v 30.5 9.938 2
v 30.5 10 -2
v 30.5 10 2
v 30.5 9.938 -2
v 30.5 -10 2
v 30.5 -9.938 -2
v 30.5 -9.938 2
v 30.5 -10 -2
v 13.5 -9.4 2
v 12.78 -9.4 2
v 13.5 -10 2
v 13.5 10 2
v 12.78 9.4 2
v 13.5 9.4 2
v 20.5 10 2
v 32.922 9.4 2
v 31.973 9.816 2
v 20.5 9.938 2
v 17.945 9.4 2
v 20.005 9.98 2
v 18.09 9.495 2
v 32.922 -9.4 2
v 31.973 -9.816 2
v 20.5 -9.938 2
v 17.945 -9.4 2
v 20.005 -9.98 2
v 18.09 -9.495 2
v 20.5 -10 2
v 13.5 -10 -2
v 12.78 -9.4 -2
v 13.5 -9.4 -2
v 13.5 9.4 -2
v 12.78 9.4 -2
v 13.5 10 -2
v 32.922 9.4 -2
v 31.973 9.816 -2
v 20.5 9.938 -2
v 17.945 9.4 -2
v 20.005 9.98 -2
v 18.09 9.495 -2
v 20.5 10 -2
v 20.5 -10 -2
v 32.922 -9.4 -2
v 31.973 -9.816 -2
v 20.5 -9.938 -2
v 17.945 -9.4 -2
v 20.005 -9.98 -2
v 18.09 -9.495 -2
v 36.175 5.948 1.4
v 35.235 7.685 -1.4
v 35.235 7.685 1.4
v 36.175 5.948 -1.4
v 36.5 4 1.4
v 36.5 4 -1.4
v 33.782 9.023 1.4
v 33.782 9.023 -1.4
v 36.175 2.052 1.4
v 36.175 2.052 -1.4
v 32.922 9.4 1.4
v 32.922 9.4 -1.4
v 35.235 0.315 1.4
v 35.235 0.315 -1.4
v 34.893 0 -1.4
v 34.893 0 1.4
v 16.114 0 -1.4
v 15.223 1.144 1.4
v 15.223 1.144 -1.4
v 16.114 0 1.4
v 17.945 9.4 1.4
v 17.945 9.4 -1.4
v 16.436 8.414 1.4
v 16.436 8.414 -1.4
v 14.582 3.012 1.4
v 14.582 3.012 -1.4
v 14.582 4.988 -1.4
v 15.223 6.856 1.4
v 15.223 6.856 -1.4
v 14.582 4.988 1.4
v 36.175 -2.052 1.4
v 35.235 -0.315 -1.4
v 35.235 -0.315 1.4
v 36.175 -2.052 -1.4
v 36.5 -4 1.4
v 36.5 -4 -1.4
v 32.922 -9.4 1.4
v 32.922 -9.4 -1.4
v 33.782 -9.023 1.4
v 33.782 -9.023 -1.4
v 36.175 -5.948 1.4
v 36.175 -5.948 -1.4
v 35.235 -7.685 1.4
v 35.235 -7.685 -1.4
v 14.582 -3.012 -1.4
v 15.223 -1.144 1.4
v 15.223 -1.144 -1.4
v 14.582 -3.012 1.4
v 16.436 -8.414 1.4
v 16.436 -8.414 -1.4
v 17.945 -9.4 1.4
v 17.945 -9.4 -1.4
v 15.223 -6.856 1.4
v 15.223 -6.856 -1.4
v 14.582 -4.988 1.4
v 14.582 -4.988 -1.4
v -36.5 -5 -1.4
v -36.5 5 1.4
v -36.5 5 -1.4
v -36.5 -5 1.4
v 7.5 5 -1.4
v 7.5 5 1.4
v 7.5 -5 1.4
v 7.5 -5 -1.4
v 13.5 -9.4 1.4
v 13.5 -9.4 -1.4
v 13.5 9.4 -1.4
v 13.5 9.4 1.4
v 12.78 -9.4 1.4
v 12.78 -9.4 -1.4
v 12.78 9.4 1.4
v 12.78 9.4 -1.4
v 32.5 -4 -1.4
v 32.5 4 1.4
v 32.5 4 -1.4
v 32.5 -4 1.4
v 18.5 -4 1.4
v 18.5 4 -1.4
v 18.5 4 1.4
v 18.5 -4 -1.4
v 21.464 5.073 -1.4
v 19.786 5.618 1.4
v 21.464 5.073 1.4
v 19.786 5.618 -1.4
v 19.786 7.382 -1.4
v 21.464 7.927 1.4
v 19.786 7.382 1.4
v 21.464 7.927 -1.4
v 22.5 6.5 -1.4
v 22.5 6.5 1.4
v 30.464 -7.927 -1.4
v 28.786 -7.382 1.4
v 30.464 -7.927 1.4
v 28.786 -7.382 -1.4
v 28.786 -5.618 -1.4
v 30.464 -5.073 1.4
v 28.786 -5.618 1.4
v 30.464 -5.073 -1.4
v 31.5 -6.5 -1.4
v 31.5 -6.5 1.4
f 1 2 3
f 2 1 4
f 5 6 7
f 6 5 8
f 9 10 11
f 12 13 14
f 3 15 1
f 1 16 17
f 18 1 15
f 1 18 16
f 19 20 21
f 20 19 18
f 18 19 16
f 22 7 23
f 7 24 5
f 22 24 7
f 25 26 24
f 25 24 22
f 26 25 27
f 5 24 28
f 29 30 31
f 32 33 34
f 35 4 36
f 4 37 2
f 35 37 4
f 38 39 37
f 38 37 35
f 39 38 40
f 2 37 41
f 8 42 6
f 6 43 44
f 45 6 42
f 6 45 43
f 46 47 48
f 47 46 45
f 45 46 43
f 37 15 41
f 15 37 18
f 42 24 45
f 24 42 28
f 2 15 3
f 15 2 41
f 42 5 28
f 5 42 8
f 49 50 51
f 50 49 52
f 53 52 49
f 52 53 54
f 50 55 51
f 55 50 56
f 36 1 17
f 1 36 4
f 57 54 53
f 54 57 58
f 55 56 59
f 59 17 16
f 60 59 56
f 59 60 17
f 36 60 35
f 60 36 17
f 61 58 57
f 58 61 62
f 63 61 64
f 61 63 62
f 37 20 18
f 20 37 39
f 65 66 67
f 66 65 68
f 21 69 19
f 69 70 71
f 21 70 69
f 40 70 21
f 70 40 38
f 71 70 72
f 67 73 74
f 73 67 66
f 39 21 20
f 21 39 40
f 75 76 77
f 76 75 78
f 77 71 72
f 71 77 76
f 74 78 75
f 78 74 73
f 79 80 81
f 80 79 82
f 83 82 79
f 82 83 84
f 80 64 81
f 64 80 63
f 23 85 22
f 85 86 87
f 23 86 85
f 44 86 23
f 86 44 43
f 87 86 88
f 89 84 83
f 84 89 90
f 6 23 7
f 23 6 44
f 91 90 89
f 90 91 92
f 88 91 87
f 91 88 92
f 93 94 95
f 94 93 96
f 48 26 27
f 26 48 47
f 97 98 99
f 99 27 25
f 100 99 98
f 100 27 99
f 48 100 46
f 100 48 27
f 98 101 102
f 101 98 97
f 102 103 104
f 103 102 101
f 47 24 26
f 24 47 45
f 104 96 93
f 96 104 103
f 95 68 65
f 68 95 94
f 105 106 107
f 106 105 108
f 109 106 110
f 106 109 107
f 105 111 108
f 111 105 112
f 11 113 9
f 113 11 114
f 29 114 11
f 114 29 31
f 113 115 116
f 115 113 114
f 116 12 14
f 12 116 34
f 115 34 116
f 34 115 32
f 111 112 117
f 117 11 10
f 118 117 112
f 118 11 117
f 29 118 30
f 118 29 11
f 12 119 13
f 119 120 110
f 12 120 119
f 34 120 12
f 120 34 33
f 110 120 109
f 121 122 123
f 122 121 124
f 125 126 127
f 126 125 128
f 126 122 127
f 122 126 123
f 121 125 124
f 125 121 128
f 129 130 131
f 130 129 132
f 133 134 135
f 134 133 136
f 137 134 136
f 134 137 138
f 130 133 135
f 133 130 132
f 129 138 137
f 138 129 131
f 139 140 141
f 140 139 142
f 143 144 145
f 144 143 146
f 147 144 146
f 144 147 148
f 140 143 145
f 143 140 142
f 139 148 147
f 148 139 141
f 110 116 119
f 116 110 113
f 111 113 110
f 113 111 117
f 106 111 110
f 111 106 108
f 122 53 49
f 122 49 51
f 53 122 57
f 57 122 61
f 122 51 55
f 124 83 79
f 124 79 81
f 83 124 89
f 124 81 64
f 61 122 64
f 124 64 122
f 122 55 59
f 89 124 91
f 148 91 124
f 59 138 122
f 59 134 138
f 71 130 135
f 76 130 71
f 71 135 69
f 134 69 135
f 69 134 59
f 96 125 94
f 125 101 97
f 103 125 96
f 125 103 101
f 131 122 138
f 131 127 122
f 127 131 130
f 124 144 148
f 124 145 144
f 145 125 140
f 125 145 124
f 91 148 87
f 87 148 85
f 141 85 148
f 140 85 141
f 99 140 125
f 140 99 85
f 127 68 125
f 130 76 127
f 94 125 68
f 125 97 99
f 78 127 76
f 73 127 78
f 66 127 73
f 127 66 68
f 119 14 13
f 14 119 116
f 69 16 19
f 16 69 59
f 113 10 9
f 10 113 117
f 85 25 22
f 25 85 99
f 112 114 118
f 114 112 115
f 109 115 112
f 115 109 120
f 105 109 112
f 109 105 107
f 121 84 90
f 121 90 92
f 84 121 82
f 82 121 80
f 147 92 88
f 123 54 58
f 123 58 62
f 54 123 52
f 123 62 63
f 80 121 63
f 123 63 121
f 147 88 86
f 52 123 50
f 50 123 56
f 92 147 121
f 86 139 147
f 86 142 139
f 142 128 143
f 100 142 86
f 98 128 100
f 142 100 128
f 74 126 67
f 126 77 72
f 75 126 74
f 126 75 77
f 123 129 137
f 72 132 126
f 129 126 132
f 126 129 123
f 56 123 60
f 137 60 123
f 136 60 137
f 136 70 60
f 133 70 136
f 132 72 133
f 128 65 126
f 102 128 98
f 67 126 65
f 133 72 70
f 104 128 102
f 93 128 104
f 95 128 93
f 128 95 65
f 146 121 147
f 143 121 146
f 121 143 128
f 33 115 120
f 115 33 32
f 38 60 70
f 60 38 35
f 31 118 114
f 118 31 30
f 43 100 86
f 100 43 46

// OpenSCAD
// Parameters
L = 73.0; //[36.5:146.0:0.5]
W_max = 20.0; //[10.0:40.0:0.5]
T = 4.0; //[2.0:8.0:0.25]
handle_L = 45.0; //[22.5:90.0:0.5]
handle_W = 10.0; //[5.0:20.0:0.5]
head_L = 22.0; //[11.0:44.0:0.5]
head_W = 20.0; //[10.0:40.0:0.5]
head_R = 6.0; //[3.0:12.0:0.25]
neck_L = 6.0; //[3.0:12.0:0.5]
window_L = 14.0; //[7.0:28.0:0.5]
window_W = 8.0; //[4.0:16.0:0.5]
hole_D = 3.0; //[1.5:6.0:0.25]
hole_offset_from_window_end = 2.5; //[1.0:5.0:0.25]
hole_offset_from_window_side = 2.5; //[1.0:5.0:0.25]
overlap = 1.0; //[0.5:2.0:0.25]
chamfer_depth = 0.6; //[0.3:1.2:0.1]
hole_chamfer_depth = 0.5; //[0.25:1.0:0.05]
hole_chamfer_D = 4.6; //[3.6:7.0:0.1]

// Base Shapes
module handle_block() {
  translate([-L/2 + handle_L/2, 0, 0])
    cube([handle_L, handle_W, T], center=true);
}

module neck_block() {
  translate([-L/2 + handle_L + neck_L/2 - overlap, 0, 0])
    cube([neck_L, handle_W, T], center=true);
}

module head_core() {
  translate([L/2 - head_L/2, 0, 0])
    cube([head_L - 2*head_R, head_W, T], center=true);
}

module head_side_band_posY() {
  translate([L/2 - head_L/2, 0, 0])
    cube([head_L - 2*head_R, head_W - 2*head_R, T], center=true);
}

module rounded_head_corner_FR() {
  translate([L/2 - head_R, head_W/2 - head_R, 0])
    cylinder(r=head_R, h=T, center=true);
}

module rounded_head_corner_FL() {
  translate([L/2 - head_L + head_R, head_W/2 - head_R, 0])
    cylinder(r=head_R, h=T, center=true);
}

module rounded_head_corner_BR() {
  translate([L/2 - head_R, -head_W/2 + head_R, 0])
    cylinder(r=head_R, h=T, center=true);
}

module rounded_head_corner_BL() {
  translate([L/2 - head_L + head_R, -head_W/2 + head_R, 0])
    cylinder(r=head_R, h=T, center=true);
}

module tapered_neck_transition() {
  linear_extrude(height=T, center=true)
    polygon(points=[
      [-neck_L/2, -handle_W/2],
      [-neck_L/2, handle_W/2],
      [neck_L/2, head_W/2],
      [neck_L/2, -head_W/2]
    ]);
}

module window_cutout() {
  translate([L/2 - head_L/2, 0, 0])
    cube([window_L, window_W, T + 2*overlap], center=true);
}

module through_hole_1() {
  translate([(L/2 - head_L/2) - window_L/2 + hole_offset_from_window_end, window_W/2 + hole_offset_from_window_side, 0])
    cylinder(r=hole_D/2, h=T + 2*overlap, center=true);
}

module through_hole_2() {
  translate([(L/2 - head_L/2) + window_L/2 - hole_offset_from_window_end, -(window_W/2 + hole_offset_from_window_side), 0])
    cylinder(r=hole_D/2, h=T + 2*overlap, center=true);
}

module edge_chamfer_top_cut() {
  translate([0, 0, T/2 - chamfer_depth/2])
    cube([L + 2*overlap, W_max - 2*chamfer_depth, chamfer_depth], center=true);
}

module edge_chamfer_bottom_cut() {
  translate([0, 0, -T/2 + chamfer_depth/2])
    cube([L + 2*overlap, W_max - 2*chamfer_depth, chamfer_depth], center=true);
}

module hole_chamfer_1_top() {
  translate([(L/2 - head_L/2) - window_L/2 + hole_offset_from_window_end, window_W/2 + hole_offset_from_window_side, T/2 - hole_chamfer_depth/2])
    cylinder(r1=hole_chamfer_D/2, r2=hole_D/2, h=hole_chamfer_depth, center=true);
}

module hole_chamfer_1_bottom() {
  translate([(L/2 - head_L/2) - window_L/2 + hole_offset_from_window_end, window_W/2 + hole_offset_from_window_side, -T/2 + hole_chamfer_depth/2])
    cylinder(r1=hole_chamfer_D/2, r2=hole_D/2, h=hole_chamfer_depth, center=true);
}

module hole_chamfer_2_top() {
  translate([(L/2 - head_L/2) + window_L/2 - hole_offset_from_window_end, -(window_W/2 + hole_offset_from_window_side), T/2 - hole_chamfer_depth/2])
    cylinder(r1=hole_chamfer_D/2, r2=hole_D/2, h=hole_chamfer_depth, center=true);
}

module hole_chamfer_2_bottom() {
  translate([(L/2 - head_L/2) + window_L/2 - hole_offset_from_window_end, -(window_W/2 + hole_offset_from_window_side), -T/2 + hole_chamfer_depth/2])
    cylinder(r1=hole_chamfer_D/2, r2=hole_D/2, h=hole_chamfer_depth, center=true);
}

// Operations
module rounded_head_corners() {
  union() {
    head_core();
    head_side_band_posY();
    rounded_head_corner_FR();
    rounded_head_corner_FL();
    rounded_head_corner_BR();
    rounded_head_corner_BL();
  }
}

module tapered_neck_transition_pos() {
  translate([-L/2 + handle_L + neck_L/2 - overlap, 0, 0])
    tapered_neck_transition();
}

module outer_plate_profile() {
  union() {
    handle_block();
    neck_block();
    tapered_neck_transition_pos();
    rounded_head_corners();
  }
}

module outer_plate_with_window() {
  difference() {
    outer_plate_profile();
    window_cutout();
  }
}

module outer_plate_with_window_and_holes() {
  difference() {
    outer_plate_with_window();
    through_hole_1();
    through_hole_2();
  }
}

module outer_plate_with_edge_chamfers() {
  difference() {
    outer_plate_with_window_and_holes();
    edge_chamfer_top_cut();
    edge_chamfer_bottom_cut();
  }
}

module outer_plate_with_hole_chamfers() {
  difference() {
    outer_plate_with_edge_chamfers();
    hole_chamfer_1_top();
    hole_chamfer_1_bottom();
    hole_chamfer_2_top();
    hole_chamfer_2_bottom();
  }
}

// Final Output
outer_plate_with_hole_chamfers();
